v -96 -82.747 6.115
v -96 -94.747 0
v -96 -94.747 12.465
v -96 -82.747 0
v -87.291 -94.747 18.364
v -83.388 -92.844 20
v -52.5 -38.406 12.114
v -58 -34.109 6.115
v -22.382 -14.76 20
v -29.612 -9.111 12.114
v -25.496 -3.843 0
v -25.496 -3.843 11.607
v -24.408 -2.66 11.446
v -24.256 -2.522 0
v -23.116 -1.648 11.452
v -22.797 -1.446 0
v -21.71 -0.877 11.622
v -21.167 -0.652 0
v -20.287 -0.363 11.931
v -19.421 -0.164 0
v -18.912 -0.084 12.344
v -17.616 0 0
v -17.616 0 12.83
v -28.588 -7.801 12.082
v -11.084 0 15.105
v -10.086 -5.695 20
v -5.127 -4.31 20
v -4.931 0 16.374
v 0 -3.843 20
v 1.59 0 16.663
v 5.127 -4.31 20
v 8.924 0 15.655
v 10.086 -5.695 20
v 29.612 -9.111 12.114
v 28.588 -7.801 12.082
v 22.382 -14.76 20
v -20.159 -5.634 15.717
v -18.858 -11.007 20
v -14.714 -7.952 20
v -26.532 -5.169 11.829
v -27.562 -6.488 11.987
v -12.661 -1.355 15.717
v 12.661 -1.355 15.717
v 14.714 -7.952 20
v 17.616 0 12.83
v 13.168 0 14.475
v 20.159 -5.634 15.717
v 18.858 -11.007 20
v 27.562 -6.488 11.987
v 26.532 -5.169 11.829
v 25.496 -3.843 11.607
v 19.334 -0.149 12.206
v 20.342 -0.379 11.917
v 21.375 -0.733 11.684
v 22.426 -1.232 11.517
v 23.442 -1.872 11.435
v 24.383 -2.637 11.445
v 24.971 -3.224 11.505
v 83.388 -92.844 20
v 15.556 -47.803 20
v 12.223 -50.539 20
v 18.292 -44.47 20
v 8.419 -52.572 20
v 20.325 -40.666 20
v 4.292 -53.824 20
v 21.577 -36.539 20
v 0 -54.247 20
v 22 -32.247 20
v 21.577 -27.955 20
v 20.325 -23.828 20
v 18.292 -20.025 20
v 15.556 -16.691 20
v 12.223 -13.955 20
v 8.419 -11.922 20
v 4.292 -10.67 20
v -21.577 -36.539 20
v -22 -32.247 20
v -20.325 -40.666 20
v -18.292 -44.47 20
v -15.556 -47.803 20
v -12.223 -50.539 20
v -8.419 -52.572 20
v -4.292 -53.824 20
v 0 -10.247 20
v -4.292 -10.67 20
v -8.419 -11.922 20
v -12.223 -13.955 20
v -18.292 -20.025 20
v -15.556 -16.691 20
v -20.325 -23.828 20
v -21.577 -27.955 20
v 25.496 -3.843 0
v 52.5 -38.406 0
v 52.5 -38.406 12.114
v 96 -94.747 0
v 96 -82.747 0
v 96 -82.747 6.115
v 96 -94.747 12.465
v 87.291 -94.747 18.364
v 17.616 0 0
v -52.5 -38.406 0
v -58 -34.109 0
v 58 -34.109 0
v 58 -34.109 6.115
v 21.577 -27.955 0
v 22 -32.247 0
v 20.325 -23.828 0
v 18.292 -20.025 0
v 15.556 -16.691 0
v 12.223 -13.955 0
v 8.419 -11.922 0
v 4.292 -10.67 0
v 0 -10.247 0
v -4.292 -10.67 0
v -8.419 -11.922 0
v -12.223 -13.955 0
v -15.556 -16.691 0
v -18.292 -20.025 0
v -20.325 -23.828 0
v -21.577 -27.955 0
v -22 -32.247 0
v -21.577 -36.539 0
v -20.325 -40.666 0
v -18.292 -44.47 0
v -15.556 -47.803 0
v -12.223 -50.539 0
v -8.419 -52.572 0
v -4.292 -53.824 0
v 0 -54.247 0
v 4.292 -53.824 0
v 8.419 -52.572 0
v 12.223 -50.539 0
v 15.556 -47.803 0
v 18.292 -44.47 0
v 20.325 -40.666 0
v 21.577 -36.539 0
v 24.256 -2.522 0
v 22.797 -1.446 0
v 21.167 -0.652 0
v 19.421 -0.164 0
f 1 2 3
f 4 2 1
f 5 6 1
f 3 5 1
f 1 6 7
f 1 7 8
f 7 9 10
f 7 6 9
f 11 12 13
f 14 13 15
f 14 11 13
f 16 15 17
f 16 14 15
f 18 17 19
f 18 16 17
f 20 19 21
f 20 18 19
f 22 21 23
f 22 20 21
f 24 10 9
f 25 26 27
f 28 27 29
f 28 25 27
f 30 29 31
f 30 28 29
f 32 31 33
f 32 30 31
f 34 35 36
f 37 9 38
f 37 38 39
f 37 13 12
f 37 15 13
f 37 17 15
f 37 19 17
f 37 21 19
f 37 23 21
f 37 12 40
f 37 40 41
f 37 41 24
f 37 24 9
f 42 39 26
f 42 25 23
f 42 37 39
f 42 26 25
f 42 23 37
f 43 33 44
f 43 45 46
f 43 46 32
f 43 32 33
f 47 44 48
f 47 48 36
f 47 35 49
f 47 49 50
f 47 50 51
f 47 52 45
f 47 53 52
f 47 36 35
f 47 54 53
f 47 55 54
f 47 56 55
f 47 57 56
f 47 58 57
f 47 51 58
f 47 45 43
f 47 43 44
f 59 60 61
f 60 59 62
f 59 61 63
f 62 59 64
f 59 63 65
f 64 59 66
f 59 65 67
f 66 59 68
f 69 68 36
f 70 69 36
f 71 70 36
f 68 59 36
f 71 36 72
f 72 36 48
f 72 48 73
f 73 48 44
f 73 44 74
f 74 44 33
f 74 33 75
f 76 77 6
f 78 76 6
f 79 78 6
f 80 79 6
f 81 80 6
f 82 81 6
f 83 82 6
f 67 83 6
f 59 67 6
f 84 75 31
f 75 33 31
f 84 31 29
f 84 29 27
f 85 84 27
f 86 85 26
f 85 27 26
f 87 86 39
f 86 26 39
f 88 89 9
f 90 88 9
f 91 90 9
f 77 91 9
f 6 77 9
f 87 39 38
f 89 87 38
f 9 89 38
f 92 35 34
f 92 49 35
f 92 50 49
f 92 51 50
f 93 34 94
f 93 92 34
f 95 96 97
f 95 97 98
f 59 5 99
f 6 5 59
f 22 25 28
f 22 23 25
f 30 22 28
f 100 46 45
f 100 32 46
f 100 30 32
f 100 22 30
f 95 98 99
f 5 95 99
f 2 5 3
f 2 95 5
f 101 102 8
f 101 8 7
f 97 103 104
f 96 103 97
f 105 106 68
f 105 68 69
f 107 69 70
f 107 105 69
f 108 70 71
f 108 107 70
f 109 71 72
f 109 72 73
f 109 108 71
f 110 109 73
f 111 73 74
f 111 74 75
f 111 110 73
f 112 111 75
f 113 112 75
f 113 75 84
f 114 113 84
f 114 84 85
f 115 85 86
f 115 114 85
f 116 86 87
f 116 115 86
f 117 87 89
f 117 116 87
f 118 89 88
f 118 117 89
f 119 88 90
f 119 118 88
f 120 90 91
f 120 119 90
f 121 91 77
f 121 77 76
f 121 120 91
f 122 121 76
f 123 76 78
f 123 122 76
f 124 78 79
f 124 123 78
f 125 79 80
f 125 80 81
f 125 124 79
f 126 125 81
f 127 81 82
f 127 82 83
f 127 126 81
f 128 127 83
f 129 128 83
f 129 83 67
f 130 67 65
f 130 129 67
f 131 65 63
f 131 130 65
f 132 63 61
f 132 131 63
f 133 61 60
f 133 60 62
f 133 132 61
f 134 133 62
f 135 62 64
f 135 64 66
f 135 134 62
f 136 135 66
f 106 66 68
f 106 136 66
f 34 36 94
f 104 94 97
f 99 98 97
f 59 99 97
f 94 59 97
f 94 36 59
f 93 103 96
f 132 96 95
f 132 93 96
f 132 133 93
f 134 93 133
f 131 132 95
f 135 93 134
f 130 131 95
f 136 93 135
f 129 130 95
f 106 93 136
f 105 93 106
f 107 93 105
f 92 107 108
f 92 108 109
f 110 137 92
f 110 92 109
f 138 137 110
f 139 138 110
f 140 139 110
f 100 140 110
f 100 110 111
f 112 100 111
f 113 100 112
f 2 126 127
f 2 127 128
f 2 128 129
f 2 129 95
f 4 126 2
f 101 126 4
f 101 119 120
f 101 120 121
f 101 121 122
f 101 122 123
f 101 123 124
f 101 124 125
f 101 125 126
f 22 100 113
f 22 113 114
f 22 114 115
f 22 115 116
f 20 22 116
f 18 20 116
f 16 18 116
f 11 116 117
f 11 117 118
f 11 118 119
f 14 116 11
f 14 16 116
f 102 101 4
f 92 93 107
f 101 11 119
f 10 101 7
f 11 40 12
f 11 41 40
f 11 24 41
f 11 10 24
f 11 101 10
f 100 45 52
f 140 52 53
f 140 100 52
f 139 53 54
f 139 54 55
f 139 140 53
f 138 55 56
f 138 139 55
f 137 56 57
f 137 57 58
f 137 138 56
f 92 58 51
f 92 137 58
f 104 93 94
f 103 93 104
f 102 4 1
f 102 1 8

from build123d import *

# Parameters (mm, degrees)
SKETCH1_R           = 22
BOSS_EXTRUDE1_DEPTH = 20


with BuildPart() as part:
    # Sketch1 → Boss-Extrude1 (new body)
    with BuildSketch(Plane.XY):
        with BuildLine():
            Line((-17.616288532, 0), (17.616288532, 0))
            ThreePointArc((17.616288532, 0), (22, -1.012059537), (25.496396068, -3.843385247))
            Line((25.496396068, -3.843385247), (52.5, -38.406422138))
            Line((52.5, -38.406422138), (58, -34.109351193))
            Line((58, -34.109351193), (96, -82.747133216))
            Line((96, -82.747133216), (96, -94.747133216))
            Line((96, -94.747133216), (-96, -94.747133216))
            Line((-96, -94.747133216), (-96, -82.747133216))
            Line((-96, -82.747133216), (-58, -34.109351193))
            Line((-58, -34.109351193), (-52.5, -38.406422138))
            Line((-52.5, -38.406422138), (-25.496396068, -3.843385247))
            ThreePointArc((-25.496396068, -3.843385247), (-22, -1.012059537), (-17.616288532, 0))
        make_face()
        with Locations((0, -32.247133216)):
            Circle(SKETCH1_R, mode=Mode.SUBTRACT)
    extrude(amount=BOSS_EXTRUDE1_DEPTH)

    # Cut-Sweep3: sweep along a path in Sketch2
    with BuildLine(Plane.XY.offset(20)) as cut_sweep3_path:
        Line((23.882346885, -13.588198867), (87.290655754, -94.747133216))
        Line((87.290655754, -94.747133216), (-87.290655754, -94.747133216))
        Line((-87.290655754, -94.747133216), (-23.882346885, -13.588198867))
        ThreePointArc((-23.882346885, -13.588198867), (0, -1.94), (23.882346885, -13.588198867))
    # Sketch3 → Cut-Sweep3 (sweep, cut)
    with BuildSketch(Plane(origin=(0, 0, 0), x_dir=(0, 0, -1), z_dir=(1, 0, 0))):
        Polygon((-20, -3.843385247), (-20, 31.059468925), (10, 31.059468925), align=None)
    sweep(path=cut_sweep3_path.line, transition=Transition.RIGHT, mode=Mode.SUBTRACT)


solid = part.part
